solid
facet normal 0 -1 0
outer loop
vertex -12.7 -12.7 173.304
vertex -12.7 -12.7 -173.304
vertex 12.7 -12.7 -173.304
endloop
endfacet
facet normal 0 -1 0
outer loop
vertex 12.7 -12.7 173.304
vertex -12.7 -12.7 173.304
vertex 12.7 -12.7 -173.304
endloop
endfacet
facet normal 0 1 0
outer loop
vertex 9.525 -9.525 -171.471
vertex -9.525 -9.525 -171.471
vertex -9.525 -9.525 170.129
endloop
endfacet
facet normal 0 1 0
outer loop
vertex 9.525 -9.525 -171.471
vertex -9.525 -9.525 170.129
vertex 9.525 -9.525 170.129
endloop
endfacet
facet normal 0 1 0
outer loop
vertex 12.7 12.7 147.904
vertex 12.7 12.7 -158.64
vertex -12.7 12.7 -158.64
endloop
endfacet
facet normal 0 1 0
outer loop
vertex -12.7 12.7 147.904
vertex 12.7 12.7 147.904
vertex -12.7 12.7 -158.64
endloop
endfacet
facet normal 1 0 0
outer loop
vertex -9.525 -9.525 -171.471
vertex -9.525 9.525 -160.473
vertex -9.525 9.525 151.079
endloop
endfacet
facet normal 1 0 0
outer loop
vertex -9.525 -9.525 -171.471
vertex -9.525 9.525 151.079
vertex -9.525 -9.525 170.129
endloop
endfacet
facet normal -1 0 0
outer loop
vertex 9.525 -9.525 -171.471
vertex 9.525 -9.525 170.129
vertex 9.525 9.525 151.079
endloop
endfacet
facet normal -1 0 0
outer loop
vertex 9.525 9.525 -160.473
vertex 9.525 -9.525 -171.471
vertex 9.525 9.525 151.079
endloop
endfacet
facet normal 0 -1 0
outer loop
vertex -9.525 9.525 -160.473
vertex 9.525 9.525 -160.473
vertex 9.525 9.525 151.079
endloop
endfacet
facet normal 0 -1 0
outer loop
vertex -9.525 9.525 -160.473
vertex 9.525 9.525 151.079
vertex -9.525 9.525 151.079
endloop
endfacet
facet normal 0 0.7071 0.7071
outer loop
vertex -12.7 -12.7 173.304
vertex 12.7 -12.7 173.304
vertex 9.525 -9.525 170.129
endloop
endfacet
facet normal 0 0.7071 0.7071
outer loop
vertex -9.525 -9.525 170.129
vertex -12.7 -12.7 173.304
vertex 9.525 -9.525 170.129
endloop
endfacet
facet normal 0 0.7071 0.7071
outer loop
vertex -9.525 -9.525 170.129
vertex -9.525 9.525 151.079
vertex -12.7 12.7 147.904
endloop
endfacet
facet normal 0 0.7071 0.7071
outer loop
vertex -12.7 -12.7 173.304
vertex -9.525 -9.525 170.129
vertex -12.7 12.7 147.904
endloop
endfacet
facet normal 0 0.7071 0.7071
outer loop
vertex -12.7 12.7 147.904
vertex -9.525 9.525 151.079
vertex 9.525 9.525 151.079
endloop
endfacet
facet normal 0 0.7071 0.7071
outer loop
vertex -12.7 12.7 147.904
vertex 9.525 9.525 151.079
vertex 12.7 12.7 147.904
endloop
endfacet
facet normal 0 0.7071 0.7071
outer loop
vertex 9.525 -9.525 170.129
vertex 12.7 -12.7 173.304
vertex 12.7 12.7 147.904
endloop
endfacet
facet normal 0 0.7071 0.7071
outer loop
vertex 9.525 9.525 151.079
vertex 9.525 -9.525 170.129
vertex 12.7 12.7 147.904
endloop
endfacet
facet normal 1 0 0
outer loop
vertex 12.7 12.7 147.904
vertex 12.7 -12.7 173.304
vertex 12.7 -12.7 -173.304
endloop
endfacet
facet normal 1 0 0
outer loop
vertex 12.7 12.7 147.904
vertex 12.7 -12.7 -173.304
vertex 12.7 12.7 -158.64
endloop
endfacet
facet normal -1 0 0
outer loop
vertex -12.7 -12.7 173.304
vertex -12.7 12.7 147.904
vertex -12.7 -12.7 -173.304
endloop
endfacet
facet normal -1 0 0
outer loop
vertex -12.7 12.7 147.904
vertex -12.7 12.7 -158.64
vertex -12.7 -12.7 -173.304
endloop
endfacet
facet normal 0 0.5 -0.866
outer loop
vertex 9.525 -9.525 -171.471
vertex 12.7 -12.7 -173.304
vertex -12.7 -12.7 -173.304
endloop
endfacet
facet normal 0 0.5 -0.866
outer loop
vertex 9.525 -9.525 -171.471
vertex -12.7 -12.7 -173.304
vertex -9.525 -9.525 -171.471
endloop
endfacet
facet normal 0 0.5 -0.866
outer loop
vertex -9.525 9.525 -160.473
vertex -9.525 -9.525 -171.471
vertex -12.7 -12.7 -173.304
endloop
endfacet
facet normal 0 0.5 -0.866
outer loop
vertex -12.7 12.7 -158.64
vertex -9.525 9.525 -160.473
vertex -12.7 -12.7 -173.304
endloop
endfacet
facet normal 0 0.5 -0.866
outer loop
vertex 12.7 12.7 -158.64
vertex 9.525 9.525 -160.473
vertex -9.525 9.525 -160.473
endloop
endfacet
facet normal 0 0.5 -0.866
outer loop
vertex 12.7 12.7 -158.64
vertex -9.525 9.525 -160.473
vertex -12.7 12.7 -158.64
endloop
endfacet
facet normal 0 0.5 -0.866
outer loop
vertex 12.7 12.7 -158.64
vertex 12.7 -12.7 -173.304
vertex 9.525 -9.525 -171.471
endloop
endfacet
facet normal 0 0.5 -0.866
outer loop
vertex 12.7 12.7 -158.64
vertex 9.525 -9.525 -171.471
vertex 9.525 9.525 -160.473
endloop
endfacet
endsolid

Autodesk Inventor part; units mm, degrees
ref_plane "YZ Plane" through (0, 0, 0) normal (1, 0, 0) x (0, 1, 0)
ref_plane "XZ Plane" through (0, 0, 0) normal (0, 1, 0) x (-1, 0, 0)
ref_plane "XY Plane" through (0, 0, 0) normal (0, 0, 1) x (1, 0, 0)
sketch "Sketch2" plane through (0, 0, 0) normal (0, 0, 1) x (1, 0, 0)
  line L0 (-12.7, -12.7) -> (12.7, -12.7)
  line L1 (12.7, -12.7) -> (12.7, 12.7)
  line L2 (12.7, 12.7) -> (-12.7, 12.7)
  line L3 (-12.7, 12.7) -> (-12.7, -12.7)
  line L4 (-12.7, -12.7) -> (12.7, 12.7) construction
  line L5 (12.7, -12.7) -> (-12.7, 12.7) construction
  line L6 (-9.525, -9.525) -> (9.525, -9.525)
  line L7 (9.525, -9.525) -> (9.525, 9.525)
  line L8 (9.525, 9.525) -> (-9.525, 9.525)
  line L9 (-9.525, 9.525) -> (-9.525, -9.525)
  line L10 (-9.525, -9.525) -> (9.525, 9.525) construction
  line L11 (9.525, -9.525) -> (-9.525, 9.525) construction
  point P0 (0, 0)
  dimension "d0" = 25.4
  dimension "d1" = 25.4
  dimension "d2" = 3.175
  dimension "d3" = 3.175
extrude "Extrusion1" add sketch "Sketch2" along normal mid plane 346.6084
sketch "Sketch5" plane through (12.7, -12.7, -173.3042) normal (1, 0, 0) x (0, 0, -1)
  line L0 (0, 0) -> (-14.6647, 25.4)
  line L1 (0, 25.4) -> (-346.6084, 25.4) projected
  line L2 (-346.6084, 0) -> (0, 0) projected
  line L3 (-14.6647, 25.4) -> (0, 25.4)
  line L4 (0, 0) -> (0, 25.4) projected
  line L5 (0, 25.4) -> (0, 0)
  point P0 (-173.3042, 12.7)
  point P1 (-557.2214, 25.4)
  point P2 (-601.2155, 0)
  dimension "d10" = 60
extrude "Extrusion3" cut sketch "Sketch5" against normal through all
sketch "Sketch6" plane through (12.7, -12.7, 173.3042) normal (1, 0, 0) x (0, 0, -1)
  line L0 (0, 0) -> (0, 25.4) projected
  line L1 (0, 0) -> (25.4, 25.4)
  line L2 (331.9437, 25.4) -> (0, 25.4) projected
  line L3 (0, 0) -> (346.6084, 0) projected
  line L4 (25.4, 25.4) -> (0, 25.4)
  line L5 (0, 25.4) -> (0, 0)
  point P0 (173.3042, 12.7)
  dimension "d13" = 45
extrude "Extrusion4" cut sketch "Sketch6" against normal through all
properties part number "aluminumBallHandlerBackLeg" material "Aluminum 6061-AHC"
